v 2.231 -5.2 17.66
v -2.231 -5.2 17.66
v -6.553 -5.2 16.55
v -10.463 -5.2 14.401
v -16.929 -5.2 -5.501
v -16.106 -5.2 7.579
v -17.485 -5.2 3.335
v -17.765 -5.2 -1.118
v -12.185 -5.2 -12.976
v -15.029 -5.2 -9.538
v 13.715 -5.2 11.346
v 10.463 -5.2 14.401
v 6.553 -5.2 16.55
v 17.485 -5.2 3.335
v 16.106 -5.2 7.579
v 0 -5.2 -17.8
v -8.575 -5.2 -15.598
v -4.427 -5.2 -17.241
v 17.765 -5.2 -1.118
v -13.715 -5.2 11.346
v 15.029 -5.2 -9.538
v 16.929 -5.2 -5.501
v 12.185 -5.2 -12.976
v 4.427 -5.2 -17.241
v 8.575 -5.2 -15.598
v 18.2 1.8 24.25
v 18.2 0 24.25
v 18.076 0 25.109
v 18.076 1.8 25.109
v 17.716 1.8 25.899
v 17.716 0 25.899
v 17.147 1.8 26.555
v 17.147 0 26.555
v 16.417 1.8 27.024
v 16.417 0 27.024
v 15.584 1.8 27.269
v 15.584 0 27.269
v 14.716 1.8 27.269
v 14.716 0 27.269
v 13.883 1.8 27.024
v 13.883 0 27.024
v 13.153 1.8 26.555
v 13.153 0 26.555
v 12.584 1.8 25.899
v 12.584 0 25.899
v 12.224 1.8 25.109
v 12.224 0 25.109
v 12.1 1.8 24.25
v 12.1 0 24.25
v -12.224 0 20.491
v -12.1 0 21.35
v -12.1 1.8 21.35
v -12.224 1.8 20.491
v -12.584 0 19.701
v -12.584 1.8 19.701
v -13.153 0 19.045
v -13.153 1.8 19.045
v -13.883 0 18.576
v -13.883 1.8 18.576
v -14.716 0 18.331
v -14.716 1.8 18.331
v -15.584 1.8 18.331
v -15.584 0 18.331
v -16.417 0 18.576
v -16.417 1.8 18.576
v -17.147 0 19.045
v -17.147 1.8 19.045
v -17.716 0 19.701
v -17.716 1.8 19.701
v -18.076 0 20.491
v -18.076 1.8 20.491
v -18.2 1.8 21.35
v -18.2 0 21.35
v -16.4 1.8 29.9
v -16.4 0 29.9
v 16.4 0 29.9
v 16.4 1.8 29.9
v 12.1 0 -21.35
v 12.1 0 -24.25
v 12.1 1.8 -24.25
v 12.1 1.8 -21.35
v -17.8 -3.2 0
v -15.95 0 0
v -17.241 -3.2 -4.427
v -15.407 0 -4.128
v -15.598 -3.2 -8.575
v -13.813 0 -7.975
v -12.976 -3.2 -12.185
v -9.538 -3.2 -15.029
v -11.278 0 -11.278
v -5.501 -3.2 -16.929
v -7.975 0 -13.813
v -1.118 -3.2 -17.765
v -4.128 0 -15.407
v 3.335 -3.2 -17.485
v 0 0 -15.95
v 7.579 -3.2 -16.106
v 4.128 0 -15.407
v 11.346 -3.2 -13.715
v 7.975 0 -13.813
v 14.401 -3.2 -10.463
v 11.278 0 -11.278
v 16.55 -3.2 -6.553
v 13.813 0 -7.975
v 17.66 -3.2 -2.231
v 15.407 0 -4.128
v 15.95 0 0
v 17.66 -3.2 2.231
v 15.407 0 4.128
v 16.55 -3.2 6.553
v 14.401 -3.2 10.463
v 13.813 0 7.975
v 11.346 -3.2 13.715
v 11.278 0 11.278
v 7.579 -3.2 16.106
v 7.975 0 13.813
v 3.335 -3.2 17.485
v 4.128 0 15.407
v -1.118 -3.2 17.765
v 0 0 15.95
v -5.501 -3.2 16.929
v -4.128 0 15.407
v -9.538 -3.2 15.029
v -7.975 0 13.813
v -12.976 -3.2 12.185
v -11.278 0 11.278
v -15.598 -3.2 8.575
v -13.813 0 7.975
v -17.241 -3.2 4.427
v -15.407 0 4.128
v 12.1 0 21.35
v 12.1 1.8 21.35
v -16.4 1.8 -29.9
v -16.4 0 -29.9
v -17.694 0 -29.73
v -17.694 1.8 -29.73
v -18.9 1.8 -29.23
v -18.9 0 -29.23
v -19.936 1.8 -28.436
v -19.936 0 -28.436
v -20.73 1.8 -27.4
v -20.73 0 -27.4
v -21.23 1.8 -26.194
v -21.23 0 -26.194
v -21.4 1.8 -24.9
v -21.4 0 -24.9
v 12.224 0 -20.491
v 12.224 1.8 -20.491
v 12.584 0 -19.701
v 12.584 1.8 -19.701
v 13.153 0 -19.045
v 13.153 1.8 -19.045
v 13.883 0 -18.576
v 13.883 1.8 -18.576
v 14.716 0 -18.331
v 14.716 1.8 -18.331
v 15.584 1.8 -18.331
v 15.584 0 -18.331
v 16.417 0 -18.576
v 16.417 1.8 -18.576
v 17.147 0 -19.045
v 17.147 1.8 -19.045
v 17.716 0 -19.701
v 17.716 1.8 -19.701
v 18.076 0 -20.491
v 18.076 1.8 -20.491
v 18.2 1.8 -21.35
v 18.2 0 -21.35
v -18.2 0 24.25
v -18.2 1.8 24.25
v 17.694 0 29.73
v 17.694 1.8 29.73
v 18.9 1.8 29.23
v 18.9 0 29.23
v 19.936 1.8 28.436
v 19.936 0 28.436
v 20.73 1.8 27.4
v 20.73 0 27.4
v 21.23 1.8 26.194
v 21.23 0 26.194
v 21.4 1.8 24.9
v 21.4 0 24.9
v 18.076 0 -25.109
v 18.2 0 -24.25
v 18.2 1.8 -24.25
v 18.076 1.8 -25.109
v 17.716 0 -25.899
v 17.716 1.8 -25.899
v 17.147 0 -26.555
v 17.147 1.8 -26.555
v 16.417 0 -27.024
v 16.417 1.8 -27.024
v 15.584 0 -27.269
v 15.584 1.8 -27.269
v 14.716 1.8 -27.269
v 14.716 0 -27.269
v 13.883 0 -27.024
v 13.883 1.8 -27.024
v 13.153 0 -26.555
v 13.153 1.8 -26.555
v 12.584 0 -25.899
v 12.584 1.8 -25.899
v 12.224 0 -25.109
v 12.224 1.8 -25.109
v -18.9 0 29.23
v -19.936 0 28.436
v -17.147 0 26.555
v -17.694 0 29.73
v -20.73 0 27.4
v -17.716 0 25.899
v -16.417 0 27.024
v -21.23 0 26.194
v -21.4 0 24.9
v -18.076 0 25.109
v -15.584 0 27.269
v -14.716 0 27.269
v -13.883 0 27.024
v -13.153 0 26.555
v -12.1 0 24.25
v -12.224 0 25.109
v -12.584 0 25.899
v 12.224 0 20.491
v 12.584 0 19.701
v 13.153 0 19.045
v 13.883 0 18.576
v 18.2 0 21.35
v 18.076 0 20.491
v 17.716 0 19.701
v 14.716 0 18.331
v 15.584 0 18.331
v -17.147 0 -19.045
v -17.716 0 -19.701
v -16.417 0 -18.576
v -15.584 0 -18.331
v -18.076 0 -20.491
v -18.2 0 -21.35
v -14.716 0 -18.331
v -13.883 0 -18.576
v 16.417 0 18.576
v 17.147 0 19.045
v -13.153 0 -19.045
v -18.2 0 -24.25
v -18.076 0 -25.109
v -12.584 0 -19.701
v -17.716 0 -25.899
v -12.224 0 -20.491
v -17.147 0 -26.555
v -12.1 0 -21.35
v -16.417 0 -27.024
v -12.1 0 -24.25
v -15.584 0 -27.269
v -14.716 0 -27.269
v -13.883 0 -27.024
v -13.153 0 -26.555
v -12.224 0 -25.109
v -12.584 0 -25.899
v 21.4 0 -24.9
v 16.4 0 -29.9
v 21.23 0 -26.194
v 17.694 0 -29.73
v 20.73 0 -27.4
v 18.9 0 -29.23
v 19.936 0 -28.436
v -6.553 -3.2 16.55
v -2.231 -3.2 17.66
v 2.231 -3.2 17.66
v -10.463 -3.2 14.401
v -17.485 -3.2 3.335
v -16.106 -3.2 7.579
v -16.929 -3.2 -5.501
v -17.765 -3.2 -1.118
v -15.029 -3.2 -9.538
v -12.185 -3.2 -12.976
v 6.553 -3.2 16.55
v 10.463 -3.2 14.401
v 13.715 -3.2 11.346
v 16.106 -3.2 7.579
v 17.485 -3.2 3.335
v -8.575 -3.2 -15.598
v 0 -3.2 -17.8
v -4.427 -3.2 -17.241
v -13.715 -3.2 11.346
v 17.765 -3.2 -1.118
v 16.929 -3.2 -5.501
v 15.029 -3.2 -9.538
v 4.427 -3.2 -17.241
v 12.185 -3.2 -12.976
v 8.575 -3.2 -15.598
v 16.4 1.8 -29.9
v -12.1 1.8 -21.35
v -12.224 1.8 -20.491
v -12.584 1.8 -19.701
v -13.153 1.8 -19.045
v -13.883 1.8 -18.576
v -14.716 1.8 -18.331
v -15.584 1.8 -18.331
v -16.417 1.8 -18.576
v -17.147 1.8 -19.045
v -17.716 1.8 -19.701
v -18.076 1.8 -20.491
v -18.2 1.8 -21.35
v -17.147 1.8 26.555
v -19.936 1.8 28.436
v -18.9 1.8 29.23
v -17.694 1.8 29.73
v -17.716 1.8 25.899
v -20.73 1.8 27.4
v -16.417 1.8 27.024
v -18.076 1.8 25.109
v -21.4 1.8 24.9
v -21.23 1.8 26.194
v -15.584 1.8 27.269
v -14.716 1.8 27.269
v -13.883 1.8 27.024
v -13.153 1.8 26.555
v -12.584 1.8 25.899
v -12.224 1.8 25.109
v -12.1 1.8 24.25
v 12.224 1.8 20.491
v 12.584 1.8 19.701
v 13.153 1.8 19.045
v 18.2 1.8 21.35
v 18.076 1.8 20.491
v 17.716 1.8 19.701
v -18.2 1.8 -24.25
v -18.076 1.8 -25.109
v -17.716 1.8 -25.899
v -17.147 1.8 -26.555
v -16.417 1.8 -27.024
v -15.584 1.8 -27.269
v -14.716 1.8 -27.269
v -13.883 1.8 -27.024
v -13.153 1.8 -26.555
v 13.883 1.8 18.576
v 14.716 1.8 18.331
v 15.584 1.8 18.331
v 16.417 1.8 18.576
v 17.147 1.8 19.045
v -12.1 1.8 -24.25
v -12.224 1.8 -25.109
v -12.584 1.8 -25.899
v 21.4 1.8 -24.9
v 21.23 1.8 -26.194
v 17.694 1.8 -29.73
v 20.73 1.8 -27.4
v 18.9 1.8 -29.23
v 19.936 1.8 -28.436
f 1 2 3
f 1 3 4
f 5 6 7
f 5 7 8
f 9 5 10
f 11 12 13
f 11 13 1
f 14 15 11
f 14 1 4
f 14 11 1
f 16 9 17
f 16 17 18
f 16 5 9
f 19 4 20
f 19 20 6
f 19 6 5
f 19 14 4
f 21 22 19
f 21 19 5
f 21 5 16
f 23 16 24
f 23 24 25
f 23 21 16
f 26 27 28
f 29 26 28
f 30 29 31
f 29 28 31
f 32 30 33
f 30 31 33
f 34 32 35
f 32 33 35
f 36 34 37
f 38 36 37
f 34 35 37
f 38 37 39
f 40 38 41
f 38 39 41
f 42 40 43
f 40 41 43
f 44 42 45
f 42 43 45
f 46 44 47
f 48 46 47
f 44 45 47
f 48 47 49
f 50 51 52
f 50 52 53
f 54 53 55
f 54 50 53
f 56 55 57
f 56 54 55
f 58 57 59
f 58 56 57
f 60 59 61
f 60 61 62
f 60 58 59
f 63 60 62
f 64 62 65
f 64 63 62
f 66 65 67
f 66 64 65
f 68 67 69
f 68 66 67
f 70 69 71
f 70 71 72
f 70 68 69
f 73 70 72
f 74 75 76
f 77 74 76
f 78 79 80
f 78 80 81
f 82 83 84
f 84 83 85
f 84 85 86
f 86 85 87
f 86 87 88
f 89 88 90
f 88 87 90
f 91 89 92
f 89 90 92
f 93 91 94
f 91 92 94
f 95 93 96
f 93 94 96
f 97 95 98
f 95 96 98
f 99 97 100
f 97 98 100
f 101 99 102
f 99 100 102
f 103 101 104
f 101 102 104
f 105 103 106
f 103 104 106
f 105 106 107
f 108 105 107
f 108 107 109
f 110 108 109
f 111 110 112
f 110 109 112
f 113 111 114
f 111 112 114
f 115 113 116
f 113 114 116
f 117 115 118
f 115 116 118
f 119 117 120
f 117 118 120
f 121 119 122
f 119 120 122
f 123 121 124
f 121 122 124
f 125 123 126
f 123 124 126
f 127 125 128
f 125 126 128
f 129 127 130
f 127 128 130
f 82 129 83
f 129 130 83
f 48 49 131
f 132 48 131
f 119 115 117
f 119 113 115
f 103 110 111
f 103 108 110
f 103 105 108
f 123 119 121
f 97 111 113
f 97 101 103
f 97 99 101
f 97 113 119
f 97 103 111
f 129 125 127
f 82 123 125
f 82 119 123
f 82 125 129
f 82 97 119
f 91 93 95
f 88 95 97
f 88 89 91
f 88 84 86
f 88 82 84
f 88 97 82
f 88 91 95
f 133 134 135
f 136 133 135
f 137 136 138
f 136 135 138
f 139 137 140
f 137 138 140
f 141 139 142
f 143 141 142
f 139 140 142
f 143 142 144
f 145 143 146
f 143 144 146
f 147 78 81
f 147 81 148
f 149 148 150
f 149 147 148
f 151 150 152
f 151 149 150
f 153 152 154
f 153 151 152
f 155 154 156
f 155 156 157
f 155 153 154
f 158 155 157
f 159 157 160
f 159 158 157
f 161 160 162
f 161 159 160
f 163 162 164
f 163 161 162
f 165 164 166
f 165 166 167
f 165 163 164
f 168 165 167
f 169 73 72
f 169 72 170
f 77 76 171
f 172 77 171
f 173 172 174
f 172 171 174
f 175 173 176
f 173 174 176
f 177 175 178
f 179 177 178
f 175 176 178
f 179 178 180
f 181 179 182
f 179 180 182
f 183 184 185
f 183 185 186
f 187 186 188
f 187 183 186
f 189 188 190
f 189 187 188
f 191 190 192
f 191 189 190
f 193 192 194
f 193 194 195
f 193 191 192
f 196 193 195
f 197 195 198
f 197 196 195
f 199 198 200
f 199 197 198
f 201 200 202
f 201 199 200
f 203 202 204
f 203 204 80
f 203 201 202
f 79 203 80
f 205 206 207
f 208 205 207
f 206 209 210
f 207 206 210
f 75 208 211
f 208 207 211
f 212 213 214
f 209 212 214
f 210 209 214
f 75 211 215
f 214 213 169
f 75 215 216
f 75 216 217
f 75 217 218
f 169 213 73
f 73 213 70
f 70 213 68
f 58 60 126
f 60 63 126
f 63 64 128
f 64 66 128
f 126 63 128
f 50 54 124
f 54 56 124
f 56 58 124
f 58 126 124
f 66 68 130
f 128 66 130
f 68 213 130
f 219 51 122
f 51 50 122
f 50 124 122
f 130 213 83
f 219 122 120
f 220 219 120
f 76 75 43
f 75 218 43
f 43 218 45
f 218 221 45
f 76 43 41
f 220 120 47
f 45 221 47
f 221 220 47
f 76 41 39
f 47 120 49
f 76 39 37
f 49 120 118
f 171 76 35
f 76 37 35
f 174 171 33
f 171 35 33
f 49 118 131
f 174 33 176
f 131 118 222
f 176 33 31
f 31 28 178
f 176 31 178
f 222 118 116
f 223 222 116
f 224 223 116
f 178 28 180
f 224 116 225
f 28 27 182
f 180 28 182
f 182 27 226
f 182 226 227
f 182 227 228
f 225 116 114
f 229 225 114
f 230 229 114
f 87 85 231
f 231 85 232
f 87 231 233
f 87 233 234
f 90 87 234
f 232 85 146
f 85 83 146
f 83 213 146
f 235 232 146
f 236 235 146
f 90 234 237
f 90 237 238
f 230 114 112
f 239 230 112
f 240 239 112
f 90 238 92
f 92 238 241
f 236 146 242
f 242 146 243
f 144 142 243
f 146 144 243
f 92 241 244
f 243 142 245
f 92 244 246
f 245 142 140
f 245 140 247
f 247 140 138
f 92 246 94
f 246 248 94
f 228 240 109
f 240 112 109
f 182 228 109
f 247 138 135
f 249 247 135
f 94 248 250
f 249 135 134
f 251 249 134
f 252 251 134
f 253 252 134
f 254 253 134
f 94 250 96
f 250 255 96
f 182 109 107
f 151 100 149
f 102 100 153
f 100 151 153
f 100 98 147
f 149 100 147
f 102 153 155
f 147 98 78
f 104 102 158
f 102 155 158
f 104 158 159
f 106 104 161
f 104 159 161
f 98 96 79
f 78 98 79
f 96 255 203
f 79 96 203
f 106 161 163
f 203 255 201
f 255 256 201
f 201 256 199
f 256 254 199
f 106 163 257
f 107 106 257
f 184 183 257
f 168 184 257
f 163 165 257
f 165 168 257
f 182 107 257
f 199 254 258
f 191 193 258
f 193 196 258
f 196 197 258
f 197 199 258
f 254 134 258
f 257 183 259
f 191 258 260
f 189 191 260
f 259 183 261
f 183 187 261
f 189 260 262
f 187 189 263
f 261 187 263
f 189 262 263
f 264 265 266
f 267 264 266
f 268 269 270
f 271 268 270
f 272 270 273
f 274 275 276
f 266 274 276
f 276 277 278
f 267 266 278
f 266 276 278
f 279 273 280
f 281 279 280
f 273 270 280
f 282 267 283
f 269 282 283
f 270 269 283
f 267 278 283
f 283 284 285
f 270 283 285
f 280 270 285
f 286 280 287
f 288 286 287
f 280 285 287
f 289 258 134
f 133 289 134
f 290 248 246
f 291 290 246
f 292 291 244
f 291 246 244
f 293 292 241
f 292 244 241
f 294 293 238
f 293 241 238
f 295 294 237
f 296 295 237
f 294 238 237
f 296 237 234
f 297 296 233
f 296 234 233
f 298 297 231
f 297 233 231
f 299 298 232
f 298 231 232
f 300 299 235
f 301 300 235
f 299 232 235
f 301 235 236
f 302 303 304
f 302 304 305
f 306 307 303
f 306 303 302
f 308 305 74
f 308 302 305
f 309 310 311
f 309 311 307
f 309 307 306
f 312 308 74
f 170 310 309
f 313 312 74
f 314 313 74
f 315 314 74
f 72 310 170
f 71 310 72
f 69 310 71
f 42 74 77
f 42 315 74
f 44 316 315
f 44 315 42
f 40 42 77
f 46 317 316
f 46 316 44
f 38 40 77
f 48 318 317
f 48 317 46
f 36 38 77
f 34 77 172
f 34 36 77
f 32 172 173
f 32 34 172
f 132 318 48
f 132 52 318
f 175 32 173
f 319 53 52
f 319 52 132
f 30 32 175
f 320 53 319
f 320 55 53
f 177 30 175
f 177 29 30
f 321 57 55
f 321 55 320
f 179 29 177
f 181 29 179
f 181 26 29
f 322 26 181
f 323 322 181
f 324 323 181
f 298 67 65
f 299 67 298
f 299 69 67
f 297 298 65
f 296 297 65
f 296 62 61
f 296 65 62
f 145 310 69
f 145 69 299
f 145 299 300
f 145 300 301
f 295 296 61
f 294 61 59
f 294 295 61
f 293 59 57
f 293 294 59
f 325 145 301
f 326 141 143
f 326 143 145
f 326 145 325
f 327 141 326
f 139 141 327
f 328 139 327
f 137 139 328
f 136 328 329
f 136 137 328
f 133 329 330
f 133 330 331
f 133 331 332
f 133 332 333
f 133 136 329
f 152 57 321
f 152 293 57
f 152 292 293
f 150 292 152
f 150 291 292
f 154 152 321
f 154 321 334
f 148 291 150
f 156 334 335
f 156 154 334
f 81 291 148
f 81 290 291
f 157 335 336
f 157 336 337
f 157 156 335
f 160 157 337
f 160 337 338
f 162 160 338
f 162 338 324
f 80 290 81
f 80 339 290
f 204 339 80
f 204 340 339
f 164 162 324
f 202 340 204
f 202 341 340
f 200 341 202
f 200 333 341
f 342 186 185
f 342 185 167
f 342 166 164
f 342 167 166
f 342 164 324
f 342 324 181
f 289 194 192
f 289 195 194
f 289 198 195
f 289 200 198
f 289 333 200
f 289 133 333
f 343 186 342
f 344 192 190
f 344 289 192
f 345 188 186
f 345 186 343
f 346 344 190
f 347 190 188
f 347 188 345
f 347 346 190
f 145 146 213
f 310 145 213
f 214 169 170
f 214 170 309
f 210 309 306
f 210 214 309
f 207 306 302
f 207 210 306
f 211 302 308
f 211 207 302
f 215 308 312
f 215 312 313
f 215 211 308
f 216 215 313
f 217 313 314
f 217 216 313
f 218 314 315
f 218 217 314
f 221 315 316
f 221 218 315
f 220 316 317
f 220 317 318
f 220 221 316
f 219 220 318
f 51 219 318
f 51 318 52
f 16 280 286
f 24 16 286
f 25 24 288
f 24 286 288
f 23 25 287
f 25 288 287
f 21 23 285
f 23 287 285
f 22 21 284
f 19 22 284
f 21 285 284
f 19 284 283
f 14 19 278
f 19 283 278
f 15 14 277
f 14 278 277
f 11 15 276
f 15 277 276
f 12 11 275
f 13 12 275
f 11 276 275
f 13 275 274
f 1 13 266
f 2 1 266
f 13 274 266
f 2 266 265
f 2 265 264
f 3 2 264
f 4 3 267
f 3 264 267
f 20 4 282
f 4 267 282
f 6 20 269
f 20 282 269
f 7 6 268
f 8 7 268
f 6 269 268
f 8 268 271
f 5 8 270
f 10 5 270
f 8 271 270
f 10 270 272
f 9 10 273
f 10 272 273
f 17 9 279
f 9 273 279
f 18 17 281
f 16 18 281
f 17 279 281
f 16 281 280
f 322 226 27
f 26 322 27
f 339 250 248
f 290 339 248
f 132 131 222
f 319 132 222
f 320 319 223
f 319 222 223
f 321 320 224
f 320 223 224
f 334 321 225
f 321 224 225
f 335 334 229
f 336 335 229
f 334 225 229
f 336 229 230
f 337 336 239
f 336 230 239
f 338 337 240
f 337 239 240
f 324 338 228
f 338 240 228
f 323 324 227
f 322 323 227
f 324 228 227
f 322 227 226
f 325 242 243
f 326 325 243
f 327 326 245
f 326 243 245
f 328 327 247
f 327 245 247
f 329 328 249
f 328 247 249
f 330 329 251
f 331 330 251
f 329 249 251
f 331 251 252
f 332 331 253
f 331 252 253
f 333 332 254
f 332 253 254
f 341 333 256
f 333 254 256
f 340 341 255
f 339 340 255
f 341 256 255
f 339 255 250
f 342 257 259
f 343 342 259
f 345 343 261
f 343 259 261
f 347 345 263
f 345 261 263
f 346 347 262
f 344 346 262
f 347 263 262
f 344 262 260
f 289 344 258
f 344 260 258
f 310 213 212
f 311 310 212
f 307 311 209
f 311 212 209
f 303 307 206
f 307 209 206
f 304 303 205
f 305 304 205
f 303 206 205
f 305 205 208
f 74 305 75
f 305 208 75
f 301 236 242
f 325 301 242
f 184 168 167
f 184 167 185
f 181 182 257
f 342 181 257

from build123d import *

# Parameters (mm, degrees)
BOSS_EXTRUDE1_DEPTH = 1.8
SKETCH3_R           = 17.8
SKETCH2_R           = 15.95
SKETCH4_R           = 17.8
BOSS_EXTRUDE2_DEPTH = 2


with BuildPart() as part:
    # Sketch1 → Boss-Extrude1 (new body)
    with BuildSketch(Plane(origin=(0, 0, 0), x_dir=(1, 0, 0), z_dir=(0, 1, 0))):
        with BuildLine():
            Line((-16.4, -29.9), (16.4, -29.9))
            ThreePointArc((16.4, -29.9), (19.935533906, -28.435533906), (21.4, -24.9))
            Line((21.4, -24.9), (21.4, 24.9))
            ThreePointArc((21.4, 24.9), (19.935533906, 28.435533906), (16.4, 29.9))
            Line((16.4, 29.9), (-16.4, 29.9))
            ThreePointArc((-16.4, 29.9), (-19.935533906, 28.435533906), (-21.4, 24.9))
            Line((-21.4, 24.9), (-21.4, -24.9))
            ThreePointArc((-21.4, -24.9), (-19.935533906, -28.435533906), (-16.4, -29.9))
        make_face()
        with BuildLine():
            Line((-12.1, 24.25), (-12.1, 21.35))
            ThreePointArc((-12.1, 21.35), (-15.15, 18.3), (-18.2, 21.35))
            Line((-18.2, 21.35), (-18.2, 24.25))
            ThreePointArc((-18.2, 24.25), (-15.15, 27.3), (-12.1, 24.25))
        make_face(mode=Mode.SUBTRACT)
        with BuildLine():
            Line((-12.1, -24.25), (-12.1, -21.35))
            ThreePointArc((-12.1, -21.35), (-15.15, -18.3), (-18.2, -21.35))
            Line((-18.2, -21.35), (-18.2, -24.25))
            ThreePointArc((-18.2, -24.25), (-15.15, -27.3), (-12.1, -24.25))
        make_face(mode=Mode.SUBTRACT)
        with BuildLine():
            Line((12.1, 24.25), (12.1, 21.35))
            ThreePointArc((12.1, 21.35), (15.15, 18.3), (18.2, 21.35))
            Line((18.2, 21.35), (18.2, 24.25))
            ThreePointArc((18.2, 24.25), (15.15, 27.3), (12.1, 24.25))
        make_face(mode=Mode.SUBTRACT)
        with BuildLine():
            Line((12.1, -24.25), (12.1, -21.35))
            ThreePointArc((12.1, -21.35), (15.15, -18.3), (18.2, -21.35))
            Line((18.2, -21.35), (18.2, -24.25))
            ThreePointArc((18.2, -24.25), (15.15, -27.3), (12.1, -24.25))
        make_face(mode=Mode.SUBTRACT)
    extrude(amount=BOSS_EXTRUDE1_DEPTH)

    # Sketch3 → Loft1 section 0
    with BuildSketch(Plane(origin=(0, -3.2, 0), x_dir=(-1, 0, 0), z_dir=(0, -1, 0))):
        Circle(SKETCH3_R)
    # Sketch2 → Loft1 section 1
    with BuildSketch(Plane.XZ):
        Circle(SKETCH2_R)
    loft()


with BuildPart() as body_2:
    # Sketch4 → Boss-Extrude2 (new body)
    with BuildSketch(Plane.XZ.offset(3.2)):
        with Locations(Location((0, 0, 0), (0, 0, 270))):
            Circle(SKETCH4_R)
    extrude(amount=BOSS_EXTRUDE2_DEPTH)


solid = Compound([part.part, body_2.part])
